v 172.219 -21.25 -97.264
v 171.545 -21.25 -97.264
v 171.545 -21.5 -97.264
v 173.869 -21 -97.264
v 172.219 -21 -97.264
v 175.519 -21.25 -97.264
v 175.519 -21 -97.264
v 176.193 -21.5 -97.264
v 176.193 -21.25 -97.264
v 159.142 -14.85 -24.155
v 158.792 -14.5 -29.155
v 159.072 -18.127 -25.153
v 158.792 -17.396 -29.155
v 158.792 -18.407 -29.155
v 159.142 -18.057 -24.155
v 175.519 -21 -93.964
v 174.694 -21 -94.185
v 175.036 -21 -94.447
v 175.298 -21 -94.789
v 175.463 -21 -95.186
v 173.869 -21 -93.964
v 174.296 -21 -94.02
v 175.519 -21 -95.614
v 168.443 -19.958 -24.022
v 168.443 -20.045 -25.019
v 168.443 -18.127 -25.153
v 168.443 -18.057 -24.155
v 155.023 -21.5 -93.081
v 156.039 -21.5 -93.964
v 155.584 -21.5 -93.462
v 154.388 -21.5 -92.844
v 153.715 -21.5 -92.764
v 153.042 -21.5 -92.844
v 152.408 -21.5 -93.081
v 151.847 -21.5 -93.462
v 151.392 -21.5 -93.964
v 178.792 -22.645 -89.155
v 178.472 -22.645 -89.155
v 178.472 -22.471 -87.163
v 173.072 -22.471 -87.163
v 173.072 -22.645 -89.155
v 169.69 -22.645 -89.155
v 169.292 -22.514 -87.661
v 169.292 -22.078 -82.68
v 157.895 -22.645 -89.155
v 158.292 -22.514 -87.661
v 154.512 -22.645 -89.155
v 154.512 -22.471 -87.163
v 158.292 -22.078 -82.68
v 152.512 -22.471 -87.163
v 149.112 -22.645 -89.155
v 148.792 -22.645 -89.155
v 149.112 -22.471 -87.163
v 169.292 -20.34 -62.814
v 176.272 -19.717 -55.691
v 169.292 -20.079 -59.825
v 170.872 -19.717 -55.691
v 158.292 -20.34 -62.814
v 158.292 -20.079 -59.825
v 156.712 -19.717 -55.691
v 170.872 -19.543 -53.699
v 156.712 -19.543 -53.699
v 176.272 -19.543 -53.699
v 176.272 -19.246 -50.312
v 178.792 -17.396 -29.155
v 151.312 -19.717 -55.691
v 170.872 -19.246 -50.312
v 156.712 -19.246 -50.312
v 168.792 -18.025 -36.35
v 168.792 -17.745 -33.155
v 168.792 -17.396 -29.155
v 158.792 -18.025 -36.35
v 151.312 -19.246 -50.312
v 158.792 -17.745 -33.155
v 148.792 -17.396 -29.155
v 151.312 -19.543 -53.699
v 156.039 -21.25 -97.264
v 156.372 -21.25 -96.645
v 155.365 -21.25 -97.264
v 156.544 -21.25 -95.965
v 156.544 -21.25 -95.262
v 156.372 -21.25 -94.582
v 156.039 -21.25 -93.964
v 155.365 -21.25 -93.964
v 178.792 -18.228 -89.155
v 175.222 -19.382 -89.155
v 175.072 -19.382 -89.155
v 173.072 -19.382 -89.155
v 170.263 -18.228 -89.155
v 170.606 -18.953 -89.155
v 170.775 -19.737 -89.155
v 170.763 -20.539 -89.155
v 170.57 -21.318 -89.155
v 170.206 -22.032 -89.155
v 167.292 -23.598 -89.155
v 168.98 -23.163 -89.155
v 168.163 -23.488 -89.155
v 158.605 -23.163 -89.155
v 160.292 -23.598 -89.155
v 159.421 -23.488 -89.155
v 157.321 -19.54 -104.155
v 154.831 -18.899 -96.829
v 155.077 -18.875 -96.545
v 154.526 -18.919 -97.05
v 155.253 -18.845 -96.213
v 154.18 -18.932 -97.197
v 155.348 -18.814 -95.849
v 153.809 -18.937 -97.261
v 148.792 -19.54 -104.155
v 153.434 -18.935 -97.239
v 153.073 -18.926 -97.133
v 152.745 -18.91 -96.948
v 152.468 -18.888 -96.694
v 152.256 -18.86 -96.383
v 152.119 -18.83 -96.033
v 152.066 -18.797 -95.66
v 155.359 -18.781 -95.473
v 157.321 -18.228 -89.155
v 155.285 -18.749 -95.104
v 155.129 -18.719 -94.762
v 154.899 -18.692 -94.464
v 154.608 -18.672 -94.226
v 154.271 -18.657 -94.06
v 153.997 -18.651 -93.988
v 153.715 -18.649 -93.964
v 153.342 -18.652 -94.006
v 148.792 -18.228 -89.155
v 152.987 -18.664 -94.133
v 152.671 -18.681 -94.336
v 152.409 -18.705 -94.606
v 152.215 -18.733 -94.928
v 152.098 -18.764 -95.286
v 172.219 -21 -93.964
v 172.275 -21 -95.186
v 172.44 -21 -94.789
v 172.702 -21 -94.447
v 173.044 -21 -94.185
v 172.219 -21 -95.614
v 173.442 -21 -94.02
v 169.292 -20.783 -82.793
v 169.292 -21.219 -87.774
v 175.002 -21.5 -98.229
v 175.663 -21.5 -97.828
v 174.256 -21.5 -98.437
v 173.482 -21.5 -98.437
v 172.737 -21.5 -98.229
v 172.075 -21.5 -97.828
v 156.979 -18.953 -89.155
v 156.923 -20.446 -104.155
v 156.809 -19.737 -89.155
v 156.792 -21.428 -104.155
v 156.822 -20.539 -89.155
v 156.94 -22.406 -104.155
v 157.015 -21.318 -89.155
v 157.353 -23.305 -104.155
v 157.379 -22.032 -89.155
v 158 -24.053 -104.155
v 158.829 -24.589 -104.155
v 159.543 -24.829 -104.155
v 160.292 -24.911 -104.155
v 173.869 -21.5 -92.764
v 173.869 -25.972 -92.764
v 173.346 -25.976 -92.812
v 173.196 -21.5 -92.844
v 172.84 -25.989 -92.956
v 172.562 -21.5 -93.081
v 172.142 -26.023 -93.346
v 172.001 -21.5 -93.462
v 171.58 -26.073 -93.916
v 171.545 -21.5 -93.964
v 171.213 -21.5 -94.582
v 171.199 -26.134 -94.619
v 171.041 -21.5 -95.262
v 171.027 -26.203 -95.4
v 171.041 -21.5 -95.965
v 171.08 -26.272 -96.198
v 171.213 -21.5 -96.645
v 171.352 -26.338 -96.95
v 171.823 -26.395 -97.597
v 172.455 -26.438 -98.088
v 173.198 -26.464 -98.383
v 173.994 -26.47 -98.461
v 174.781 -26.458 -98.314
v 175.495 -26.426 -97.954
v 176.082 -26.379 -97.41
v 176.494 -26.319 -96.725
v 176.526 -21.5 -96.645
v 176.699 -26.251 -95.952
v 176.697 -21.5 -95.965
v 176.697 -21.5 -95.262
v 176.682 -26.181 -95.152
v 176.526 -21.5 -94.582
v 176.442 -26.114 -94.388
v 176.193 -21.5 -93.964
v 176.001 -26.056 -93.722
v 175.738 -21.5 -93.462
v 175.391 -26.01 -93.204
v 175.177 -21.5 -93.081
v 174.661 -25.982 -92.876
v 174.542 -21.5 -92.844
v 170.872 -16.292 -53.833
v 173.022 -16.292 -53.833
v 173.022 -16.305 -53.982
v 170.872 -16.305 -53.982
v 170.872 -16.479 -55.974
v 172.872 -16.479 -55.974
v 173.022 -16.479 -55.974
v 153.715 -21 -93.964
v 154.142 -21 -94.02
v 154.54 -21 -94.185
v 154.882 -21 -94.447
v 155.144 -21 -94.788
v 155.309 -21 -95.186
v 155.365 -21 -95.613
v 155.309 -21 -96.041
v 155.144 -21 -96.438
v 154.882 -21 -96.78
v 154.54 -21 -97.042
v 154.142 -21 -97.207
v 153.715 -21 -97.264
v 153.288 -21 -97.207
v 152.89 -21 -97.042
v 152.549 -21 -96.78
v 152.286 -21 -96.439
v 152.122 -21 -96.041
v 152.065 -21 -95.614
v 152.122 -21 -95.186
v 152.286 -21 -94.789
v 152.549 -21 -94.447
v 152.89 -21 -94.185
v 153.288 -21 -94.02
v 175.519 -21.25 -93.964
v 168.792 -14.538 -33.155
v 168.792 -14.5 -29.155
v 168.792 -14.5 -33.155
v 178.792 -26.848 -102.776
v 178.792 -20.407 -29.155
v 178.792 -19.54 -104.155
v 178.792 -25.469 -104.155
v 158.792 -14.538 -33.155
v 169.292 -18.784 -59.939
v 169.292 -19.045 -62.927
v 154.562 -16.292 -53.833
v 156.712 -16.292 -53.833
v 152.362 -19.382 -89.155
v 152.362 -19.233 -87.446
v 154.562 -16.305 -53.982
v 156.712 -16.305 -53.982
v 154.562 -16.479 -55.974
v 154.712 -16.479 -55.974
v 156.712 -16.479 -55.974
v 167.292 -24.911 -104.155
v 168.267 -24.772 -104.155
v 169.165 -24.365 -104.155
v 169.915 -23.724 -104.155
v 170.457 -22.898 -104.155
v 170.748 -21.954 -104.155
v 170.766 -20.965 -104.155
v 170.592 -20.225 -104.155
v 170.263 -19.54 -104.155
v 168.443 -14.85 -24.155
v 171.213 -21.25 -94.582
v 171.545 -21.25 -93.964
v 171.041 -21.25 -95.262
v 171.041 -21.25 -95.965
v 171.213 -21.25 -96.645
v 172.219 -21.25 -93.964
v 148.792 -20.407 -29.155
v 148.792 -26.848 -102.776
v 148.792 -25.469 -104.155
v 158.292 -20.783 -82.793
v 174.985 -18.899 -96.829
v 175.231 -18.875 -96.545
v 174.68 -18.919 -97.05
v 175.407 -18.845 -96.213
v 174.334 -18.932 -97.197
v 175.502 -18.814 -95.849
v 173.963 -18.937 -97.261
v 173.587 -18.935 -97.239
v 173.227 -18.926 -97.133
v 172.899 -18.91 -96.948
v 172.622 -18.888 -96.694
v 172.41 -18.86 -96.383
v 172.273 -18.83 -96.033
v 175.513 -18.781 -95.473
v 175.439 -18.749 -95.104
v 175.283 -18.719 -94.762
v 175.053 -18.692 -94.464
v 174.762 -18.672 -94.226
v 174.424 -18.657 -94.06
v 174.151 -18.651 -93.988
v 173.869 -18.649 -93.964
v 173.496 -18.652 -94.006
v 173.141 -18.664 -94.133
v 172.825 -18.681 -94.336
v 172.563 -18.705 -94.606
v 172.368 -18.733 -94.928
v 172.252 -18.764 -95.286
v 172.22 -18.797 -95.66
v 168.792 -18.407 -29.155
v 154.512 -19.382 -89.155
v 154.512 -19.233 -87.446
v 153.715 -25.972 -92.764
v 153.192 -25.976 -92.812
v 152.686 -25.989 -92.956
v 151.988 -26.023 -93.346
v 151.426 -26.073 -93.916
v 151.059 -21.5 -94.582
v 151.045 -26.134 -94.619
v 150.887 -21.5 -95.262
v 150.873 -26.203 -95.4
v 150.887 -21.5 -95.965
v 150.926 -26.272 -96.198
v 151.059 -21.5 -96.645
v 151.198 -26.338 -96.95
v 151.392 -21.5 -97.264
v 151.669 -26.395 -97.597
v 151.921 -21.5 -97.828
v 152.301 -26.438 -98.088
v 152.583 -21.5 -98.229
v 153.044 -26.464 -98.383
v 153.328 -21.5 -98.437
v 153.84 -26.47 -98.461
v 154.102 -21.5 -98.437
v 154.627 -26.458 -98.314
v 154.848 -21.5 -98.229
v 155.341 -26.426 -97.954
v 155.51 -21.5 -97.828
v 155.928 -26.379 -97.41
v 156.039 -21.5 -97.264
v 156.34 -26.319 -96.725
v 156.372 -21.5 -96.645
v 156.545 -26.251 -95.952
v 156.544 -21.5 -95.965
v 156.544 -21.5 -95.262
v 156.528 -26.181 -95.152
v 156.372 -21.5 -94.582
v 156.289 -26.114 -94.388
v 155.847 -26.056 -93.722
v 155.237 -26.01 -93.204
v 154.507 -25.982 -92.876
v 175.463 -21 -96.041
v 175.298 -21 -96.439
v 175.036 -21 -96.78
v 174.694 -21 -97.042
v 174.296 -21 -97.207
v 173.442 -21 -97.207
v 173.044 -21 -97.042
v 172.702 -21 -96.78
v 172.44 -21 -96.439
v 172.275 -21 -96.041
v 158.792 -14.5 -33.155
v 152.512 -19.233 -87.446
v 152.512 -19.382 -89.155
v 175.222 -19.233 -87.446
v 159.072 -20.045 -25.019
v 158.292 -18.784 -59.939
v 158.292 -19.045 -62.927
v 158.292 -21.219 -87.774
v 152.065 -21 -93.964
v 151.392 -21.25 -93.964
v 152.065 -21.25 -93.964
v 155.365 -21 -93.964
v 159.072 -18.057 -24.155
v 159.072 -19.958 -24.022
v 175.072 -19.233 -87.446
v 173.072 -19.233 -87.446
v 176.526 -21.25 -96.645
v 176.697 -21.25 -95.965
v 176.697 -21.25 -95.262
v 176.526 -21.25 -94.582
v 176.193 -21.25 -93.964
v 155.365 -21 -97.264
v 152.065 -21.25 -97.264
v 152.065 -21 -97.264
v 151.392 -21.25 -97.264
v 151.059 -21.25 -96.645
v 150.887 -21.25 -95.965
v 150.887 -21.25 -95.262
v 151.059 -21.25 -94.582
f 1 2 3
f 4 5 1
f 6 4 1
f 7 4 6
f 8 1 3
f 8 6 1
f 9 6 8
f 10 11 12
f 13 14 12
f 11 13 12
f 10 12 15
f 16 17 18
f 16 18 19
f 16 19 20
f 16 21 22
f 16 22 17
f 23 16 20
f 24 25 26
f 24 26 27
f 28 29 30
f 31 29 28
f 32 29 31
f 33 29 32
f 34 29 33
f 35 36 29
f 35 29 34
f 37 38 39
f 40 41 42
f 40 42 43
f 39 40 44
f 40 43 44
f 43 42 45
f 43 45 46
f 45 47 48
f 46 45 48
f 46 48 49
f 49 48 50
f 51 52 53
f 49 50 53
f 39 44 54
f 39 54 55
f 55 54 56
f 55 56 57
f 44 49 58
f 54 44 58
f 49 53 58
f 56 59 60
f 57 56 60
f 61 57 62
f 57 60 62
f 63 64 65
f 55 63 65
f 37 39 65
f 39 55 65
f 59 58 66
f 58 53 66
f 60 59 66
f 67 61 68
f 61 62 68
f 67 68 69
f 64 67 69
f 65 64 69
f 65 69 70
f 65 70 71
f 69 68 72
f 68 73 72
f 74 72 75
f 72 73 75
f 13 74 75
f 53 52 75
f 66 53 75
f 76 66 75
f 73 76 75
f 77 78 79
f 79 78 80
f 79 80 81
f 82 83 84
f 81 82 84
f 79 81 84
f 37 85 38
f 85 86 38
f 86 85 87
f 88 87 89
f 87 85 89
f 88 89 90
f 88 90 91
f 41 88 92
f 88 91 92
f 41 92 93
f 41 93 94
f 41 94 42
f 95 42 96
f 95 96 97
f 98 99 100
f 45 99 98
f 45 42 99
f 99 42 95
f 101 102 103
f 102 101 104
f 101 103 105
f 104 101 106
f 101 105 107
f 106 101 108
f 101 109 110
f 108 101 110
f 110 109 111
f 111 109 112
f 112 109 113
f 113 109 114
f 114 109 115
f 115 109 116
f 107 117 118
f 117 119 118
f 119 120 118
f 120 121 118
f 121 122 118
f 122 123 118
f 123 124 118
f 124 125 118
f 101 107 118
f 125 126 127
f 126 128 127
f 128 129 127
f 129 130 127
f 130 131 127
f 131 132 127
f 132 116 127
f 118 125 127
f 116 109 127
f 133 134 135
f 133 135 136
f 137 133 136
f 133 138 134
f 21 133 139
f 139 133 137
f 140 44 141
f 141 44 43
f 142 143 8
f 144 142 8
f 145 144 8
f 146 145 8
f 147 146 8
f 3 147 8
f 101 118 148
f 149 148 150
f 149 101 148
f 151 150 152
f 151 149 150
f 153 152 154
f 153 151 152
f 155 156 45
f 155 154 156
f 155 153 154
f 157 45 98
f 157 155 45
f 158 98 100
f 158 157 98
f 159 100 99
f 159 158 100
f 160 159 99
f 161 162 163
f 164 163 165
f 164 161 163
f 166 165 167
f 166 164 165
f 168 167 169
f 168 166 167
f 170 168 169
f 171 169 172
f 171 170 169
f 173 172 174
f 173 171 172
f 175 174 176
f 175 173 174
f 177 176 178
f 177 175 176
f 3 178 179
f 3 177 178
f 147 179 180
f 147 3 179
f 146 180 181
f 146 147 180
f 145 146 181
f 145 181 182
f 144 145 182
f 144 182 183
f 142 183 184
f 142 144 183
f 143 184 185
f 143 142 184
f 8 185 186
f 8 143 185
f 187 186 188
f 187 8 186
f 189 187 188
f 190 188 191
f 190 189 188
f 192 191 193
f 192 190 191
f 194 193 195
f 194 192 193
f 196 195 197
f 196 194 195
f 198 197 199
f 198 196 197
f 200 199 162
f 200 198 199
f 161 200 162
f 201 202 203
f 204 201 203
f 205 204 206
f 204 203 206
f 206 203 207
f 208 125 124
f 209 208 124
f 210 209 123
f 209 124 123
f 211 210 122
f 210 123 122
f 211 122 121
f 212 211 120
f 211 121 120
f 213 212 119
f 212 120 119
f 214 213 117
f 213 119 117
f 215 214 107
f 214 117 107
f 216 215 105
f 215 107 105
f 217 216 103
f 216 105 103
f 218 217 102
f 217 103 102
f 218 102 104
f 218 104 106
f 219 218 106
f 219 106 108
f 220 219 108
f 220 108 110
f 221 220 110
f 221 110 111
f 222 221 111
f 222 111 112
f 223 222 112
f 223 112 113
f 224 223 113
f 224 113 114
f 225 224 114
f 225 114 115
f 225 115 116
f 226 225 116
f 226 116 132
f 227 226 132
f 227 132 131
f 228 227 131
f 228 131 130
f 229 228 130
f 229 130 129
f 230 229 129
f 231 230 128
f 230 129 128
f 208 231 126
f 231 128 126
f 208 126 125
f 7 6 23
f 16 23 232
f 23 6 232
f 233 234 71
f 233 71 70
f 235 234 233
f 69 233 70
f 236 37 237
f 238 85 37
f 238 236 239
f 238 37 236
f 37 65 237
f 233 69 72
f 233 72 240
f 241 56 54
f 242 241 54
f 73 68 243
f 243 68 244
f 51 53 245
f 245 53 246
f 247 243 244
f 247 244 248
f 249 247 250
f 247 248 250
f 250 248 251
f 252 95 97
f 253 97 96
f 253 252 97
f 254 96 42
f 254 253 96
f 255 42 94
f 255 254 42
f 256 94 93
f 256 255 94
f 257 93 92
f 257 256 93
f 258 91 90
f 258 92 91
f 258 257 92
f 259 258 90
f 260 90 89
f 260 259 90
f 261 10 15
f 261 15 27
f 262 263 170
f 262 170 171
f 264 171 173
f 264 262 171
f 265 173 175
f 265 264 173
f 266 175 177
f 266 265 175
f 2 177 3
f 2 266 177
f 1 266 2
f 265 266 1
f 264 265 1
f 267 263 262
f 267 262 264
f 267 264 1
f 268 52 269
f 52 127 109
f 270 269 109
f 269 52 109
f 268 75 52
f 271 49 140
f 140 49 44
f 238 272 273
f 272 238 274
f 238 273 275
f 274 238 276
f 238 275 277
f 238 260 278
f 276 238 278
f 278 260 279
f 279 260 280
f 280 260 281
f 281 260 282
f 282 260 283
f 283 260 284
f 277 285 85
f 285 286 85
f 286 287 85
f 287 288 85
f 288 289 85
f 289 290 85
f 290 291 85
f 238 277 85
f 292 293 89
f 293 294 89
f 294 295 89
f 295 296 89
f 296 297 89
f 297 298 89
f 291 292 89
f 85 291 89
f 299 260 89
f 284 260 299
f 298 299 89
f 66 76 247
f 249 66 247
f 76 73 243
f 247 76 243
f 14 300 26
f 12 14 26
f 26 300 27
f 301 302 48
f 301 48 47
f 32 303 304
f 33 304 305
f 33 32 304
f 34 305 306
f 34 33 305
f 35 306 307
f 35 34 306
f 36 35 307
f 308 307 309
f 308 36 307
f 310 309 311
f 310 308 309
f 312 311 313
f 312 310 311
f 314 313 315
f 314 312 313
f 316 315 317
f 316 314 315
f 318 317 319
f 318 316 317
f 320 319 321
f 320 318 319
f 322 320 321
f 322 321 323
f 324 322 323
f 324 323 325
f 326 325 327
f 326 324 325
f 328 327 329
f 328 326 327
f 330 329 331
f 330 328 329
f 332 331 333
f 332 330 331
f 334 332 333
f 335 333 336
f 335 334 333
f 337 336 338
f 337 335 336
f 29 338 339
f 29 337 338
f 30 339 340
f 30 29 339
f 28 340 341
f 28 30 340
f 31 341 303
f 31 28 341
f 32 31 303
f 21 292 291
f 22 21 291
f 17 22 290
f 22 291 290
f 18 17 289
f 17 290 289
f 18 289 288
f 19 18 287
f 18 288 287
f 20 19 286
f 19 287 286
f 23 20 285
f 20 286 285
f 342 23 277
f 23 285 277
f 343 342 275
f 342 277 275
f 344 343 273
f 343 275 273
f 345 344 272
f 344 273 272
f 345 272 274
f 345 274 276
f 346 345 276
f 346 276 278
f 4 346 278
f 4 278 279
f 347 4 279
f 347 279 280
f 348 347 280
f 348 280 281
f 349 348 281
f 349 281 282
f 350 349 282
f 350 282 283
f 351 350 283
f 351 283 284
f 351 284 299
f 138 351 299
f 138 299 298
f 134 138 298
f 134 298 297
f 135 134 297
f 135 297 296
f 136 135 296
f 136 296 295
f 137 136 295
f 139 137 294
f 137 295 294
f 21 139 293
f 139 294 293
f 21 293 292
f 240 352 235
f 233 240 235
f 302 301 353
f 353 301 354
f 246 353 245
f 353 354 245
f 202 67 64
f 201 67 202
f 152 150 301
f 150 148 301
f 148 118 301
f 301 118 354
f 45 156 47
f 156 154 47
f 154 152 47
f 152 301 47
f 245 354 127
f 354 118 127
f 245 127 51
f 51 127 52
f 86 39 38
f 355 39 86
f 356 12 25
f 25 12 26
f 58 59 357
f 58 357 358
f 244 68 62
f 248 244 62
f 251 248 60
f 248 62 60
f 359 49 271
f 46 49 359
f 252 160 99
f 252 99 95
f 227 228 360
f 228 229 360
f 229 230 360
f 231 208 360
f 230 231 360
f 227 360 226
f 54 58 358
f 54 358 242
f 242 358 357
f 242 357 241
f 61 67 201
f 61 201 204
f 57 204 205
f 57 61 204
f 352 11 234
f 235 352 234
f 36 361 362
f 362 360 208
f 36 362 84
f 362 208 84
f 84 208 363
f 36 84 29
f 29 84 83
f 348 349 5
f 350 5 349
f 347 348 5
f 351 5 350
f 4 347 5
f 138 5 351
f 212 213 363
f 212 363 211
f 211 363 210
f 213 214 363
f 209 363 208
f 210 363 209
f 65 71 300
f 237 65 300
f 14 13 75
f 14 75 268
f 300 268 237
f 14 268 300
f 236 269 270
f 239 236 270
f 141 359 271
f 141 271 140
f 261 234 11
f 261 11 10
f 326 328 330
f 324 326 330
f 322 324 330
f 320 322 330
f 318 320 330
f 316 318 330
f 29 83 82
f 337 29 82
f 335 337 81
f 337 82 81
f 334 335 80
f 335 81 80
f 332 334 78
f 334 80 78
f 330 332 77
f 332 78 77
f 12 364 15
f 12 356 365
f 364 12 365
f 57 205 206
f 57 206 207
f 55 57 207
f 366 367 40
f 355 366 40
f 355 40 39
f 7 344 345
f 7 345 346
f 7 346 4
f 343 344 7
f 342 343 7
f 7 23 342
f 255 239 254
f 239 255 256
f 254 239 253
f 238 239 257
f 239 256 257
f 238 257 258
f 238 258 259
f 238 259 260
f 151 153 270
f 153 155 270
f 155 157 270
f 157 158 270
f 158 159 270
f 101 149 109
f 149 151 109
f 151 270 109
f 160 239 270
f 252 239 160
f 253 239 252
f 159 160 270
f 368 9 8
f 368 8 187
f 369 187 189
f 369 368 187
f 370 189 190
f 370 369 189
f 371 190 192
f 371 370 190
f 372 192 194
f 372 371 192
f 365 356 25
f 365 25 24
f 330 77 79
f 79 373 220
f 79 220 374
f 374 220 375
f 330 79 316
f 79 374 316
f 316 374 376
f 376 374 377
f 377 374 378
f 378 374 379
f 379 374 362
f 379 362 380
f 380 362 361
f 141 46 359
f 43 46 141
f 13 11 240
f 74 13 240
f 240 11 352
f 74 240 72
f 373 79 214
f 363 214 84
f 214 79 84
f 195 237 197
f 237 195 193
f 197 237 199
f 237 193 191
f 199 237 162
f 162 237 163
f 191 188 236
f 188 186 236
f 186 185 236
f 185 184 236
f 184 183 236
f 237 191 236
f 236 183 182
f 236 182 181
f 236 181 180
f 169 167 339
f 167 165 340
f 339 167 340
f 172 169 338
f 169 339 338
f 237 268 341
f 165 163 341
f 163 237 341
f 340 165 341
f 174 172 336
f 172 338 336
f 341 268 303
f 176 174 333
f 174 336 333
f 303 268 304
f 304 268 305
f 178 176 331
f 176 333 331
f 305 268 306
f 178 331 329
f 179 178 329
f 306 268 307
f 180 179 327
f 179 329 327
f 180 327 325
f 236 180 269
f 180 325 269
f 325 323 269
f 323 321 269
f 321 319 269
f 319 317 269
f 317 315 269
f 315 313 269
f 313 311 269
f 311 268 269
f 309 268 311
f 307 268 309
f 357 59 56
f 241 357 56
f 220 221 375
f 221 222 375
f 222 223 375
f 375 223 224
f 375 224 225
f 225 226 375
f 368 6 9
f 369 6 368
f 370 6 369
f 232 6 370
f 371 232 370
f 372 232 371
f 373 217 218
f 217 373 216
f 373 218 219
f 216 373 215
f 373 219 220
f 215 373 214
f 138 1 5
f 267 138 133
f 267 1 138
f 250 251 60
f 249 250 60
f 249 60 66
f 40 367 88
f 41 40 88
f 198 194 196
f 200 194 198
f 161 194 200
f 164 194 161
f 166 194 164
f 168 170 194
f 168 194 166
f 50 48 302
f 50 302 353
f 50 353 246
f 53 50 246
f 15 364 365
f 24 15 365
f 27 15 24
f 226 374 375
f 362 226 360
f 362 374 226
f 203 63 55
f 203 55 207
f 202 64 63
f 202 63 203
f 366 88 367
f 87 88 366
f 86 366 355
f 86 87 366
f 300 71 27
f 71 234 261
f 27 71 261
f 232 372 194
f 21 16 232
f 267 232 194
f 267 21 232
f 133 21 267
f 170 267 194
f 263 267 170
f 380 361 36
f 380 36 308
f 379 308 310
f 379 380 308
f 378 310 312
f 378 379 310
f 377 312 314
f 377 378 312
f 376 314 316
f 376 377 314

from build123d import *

# Parameters (mm, degrees)
BOSS_EXTRUDE2_DEPTH = 30
CUT_EXTRUDE1_REACH  = 197.235
CUT_EXTRUDE2_START  = 7
SKETCH6_R           = 2.85
CUT_EXTRUDE2_DEPTH  = 201.285862098
SKETCH7_R           = 1.65
CUT_EXTRUDE3_DEPTH  = 209.121088475
SKETCH9_W           = 10
SKETCH9_H           = 5.906967626
BOSS_EXTRUDE4_DEPTH = 4
SKETCH10_W          = 10
SKETCH10_H          = 3.906967626
BOSS_EXTRUDE5_DEPTH = 5
BOSS_EXTRUDE5_TAPER = 4
FILLET1_SIZE        = 3.5
CUT_EXTRUDE4_START  = -0.25
CUT_EXTRUDE4_DEPTH  = 0.25
SKETCH12_W          = 3.3
SKETCH12_H          = 3.3
CUT_EXTRUDE5_DEPTH  = 0.25
SKETCH13_W          = 2
SKETCH13_H          = 2
BOSS_EXTRUDE6_DEPTH = 3.25
BOSS_EXTRUDE7_REACH = 209.762
SKETCH14_W          = 9.370488354
SKETCH14_H          = 1
SKETCH17_W          = 11
SKETCH17_H          = 5
SKETCH17_H_2        = 3
BOSS_EXTRUDE8_DEPTH = 1.3


with BuildPart() as part:
    # Sketch2 → Boss-Extrude2 (new body)
    with BuildSketch(Plane(origin=(148.792269218, 0, 0), x_dir=(0, 0, -1), z_dir=(1, 0, 0))):
        Polygon((89.155083501, -18.22802064), (89.155083501, -22.644827925), (29.155083501, -17.395508114), (29.155083501, -20.406967626), (102.775758778, -26.847942114), (104.155083501, -25.468617391), (104.155083501, -19.540350593), align=None)
    extrude(amount=BOSS_EXTRUDE2_DEPTH)

    # Cut-Extrude1: up to this plane
    cut_extrude1_end = Plane(origin=(254.385579164, -18.22802064, -89.155083501), z_dir=(0, 0, -1))
    # Sketch4 → Cut-Extrude1 (cut, up to the surface)
    with BuildSketch(Plane(origin=(0, -9.236632985, -105.575198123), x_dir=(-1, 0, 0), z_dir=(0, -0.0871557427476512, -0.9961946980917462)), mode=Mode.PRIVATE) as cut_extrude1_sk1:
        with BuildLine():
            Line((-167.292269218, -8.738279996), (-160.292269218, -8.738279996))
            ThreePointArc((-160.292269218, -8.738279996), (-156.792269218, -12.238279996), (-160.292269218, -15.738279996))
            Line((-160.292269218, -15.738279996), (-167.292269218, -15.738279996))
            ThreePointArc((-167.292269218, -15.738279996), (-170.792269218, -12.238279996), (-167.292269218, -8.738279996))
        make_face()
    cut_extrude1_tool1 = split(extrude(cut_extrude1_sk1.sketch, amount=-CUT_EXTRUDE1_REACH, mode=Mode.PRIVATE), bisect_by=cut_extrude1_end, keep=Keep.BOTH, mode=Mode.PRIVATE)
    add(cut_extrude1_tool1.solids().sort_by_distance((163.792269, -21.428343, -104.508562))[0], mode=Mode.SUBTRACT)

    # Sketch6 → Cut-Extrude2 (cut, through all)
    with BuildSketch(Plane(origin=(0, -14.5, 0), x_dir=(-1, 0, 0), z_dir=(0, -1, 0)).offset(CUT_EXTRUDE2_START)):
        with Locations(Location((-173.869198237, 95.613531365, 0), (0, 0, 270))):
            Circle(SKETCH6_R)
        with Locations(Location((-153.7153402, 95.613531365, 0), (0, 0, 270))):
            Circle(SKETCH6_R)
    extrude(amount=CUT_EXTRUDE2_DEPTH, mode=Mode.SUBTRACT)

    # Sketch7 → Cut-Extrude3 (cut, through all)
    with BuildSketch(Plane(origin=(0, -4.5, 0), x_dir=(1, 0, 0), z_dir=(0, 1, 0))):
        with Locations(Location((173.869198237, 95.613531365, 0), (0, 0, 270))):
            Circle(SKETCH7_R)
        with Locations(Location((153.7153402, 95.613531365, 0), (0, 0, 270))):
            Circle(SKETCH7_R)
    extrude(amount=-CUT_EXTRUDE3_DEPTH, mode=Mode.SUBTRACT)

    # Sketch9 → Boss-Extrude4 (add)
    with BuildSketch(Plane.XY.offset(-29.155083501)):
        with Locations((163.792269218, -17.453483813)):
            Rectangle(SKETCH9_W, SKETCH9_H)
    extrude(amount=-BOSS_EXTRUDE4_DEPTH)

    # Sketch10 → Boss-Extrude5 (add)
    with BuildSketch(Plane.XY.offset(-29.155083501)):
        with Locations((163.792269218, -16.453483813)):
            Rectangle(SKETCH10_W, SKETCH10_H)
    extrude(amount=BOSS_EXTRUDE5_DEPTH, taper=BOSS_EXTRUDE5_TAPER)

    # Fillet1
    # the kernel refuses this chamfer: 3.5 mm, written as the material it adds along each edge
    with BuildSketch(Plane(origin=(158.792269218, -17.745462768, -33.155083501), x_dir=(0, -0.11557140669619721, -0.9932991744455757), z_dir=(1, 0, 0))) as fillet1_piece_1:
        Polygon((FILLET1_SIZE * 0.915957386947, FILLET1_SIZE * 0.0261703223739), (-FILLET1_SIZE * 0.105901682781, FILLET1_SIZE * 0.91019099867), (0, 0), align=None)
    extrude(amount=10)

    # Sketch11 → Cut-Extrude4 (cut)
    with BuildSketch(Plane.XZ.offset(21.5).offset(CUT_EXTRUDE4_START)):
        with BuildLine():
            Line((171.545408229, -97.263531365), (176.192988244, -97.263531365))
            ThreePointArc((176.192988244, -97.263531365), (176.719198237, -95.613531365), (176.192988244, -93.963531365))
            Line((176.192988244, -93.963531365), (171.545408229, -93.963531365))
            ThreePointArc((171.545408229, -93.963531365), (171.019198237, -95.613531365), (171.545408229, -97.263531365))
        make_face()
    cut_extrude4 = extrude(amount=CUT_EXTRUDE4_DEPTH, mode=Mode.SUBTRACT)

    # Sketch12 → Cut-Extrude5 (cut)
    with BuildSketch(Plane.XZ.offset(21.25)):
        with Locations((173.869198237, -95.613531365)):
            Rectangle(SKETCH12_W, SKETCH12_H)
    cut_extrude5 = extrude(amount=-CUT_EXTRUDE5_DEPTH, mode=Mode.SUBTRACT)

    # Mirror1: Cut-Extrude4, Cut-Extrude5 across plane
    add(cut_extrude4.mirror(Plane(origin=(163.792269218, 0, 0), x_dir=(0, 0, 1), z_dir=(1, 0, 0))), mode=Mode.SUBTRACT)
    add(cut_extrude5.mirror(Plane(origin=(163.792269218, 0, 0), x_dir=(0, 0, 1), z_dir=(1, 0, 0))), mode=Mode.SUBTRACT)

    # Sketch13 → Boss-Extrude6 (add)
    with BuildSketch(Plane(origin=(0, -14.732006126, 1.288883527), x_dir=(1, 0, 0), z_dir=(0, 0.9961946980917463, -0.08715574274765082))):
        with Locations((171.872269218, 56.19771425)):
            Rectangle(SKETCH13_W, SKETCH13_H)
        with Locations((174.072269218, 89.789448289)):
            Rectangle(SKETCH13_W, SKETCH13_H)
    boss_extrude6 = extrude(amount=BOSS_EXTRUDE6_DEPTH)

    # Chamfer1
    # the kernel refuses this chamfer: 3.4 mm, written as the material it adds along each edge
    with BuildSketch(Plane(origin=(170.872269218, -19.542803909, -53.698786756), x_dir=(0, 0.059731544136399986, 0.9982144772718343), z_dir=(1, 0, 0))) as chamfer1_piece_1_section:
        with BuildLine():
            Line((3.497488864, 0), (-0.192260327, -3.492200498))
            Line((-0.192260327, -3.492200498), (-0.260234617, -3.490330778))
            ThreePointArc((-0.260234617, -3.490330778), (-0.116039372, -1.745552621), (-0.06797429, 0.00186972))
            Line((-0.06797429, 0.00186972), (0.00186972, 0.06797429))
            ThreePointArc((0.00186972, 0.06797429), (1.74929206, 0.019909209), (3.499358583, 0.06797429))
            Line((3.499358583, 0.06797429), (3.497488864, 0))
        make_face()
    chamfer1_piece_1 = extrude(amount=2, mode=Mode.PRIVATE)
    chamfer1_piece_1 = split(chamfer1_piece_1, bisect_by=Plane(origin=(171.872269218, -16.206722557, -52.85677046), z_dir=(0, -0.9961946980917463, 0.08715574274765082)), keep=Keep.TOP, mode=Mode.PRIVATE)
    add(chamfer1_piece_1)
    with BuildSketch(Plane(origin=(172.872269218, -19.542803909, -53.698786756), x_dir=(0.999621916911297, -0.027391246498838125, 0.002396423548492289), z_dir=(0, -0.08715574274765082, -0.9961946980917463))) as chamfer1_piece_2_section:
        with BuildLine():
            Line((3.497488864, 0), (-0.192260327, -3.492200498))
            Line((-0.192260327, -3.492200498), (-0.260234617, -3.490330778))
            ThreePointArc((-0.260234617, -3.490330778), (-0.116039372, -1.745552621), (-0.06797429, 0.00186972))
            Line((-0.06797429, 0.00186972), (0.00186972, 0.06797429))
            ThreePointArc((0.00186972, 0.06797429), (1.74929206, 0.019909209), (3.499358583, 0.06797429))
            Line((3.499358583, 0.06797429), (3.497488864, 0))
        make_face()
    chamfer1_piece_2 = extrude(amount=2, mode=Mode.PRIVATE)
    chamfer1_piece_2 = split(chamfer1_piece_2, bisect_by=Plane(origin=(174.001840036, -16.392326883, -54.978237618), z_dir=(0, -0.9961946980917463, 0.08715574274765082)), keep=Keep.TOP, mode=Mode.PRIVATE)
    add(chamfer1_piece_2)
    with BuildSketch(Plane(origin=(175.072269218, -22.47051644, -87.162694105), x_dir=(0.9996219169112963, -0.027391246498863667, 0.0023964235484945228), z_dir=(0, -0.08715574274765082, -0.9961946980917463))) as chamfer1_piece_3_section:
        with BuildLine():
            Line((3.497488864, 0), (-0.192260327, -3.492200498))
            Line((-0.192260327, -3.492200498), (-0.260234617, -3.490330778))
            ThreePointArc((-0.260234617, -3.490330778), (-0.116039372, -1.745552621), (-0.06797429, 0.00186972))
            Line((-0.06797429, 0.00186972), (0.00186972, 0.06797429))
            ThreePointArc((0.00186972, 0.06797429), (1.74929206, 0.019909209), (3.499358583, 0.06797429))
            Line((3.499358583, 0.06797429), (3.497488864, 0))
        make_face()
    chamfer1_piece_3 = extrude(amount=10.743722159, mode=Mode.PRIVATE)
    chamfer1_piece_3 = split(chamfer1_piece_3, bisect_by=Plane(origin=(176.219153997, -21.484451045, -89.155083501), z_dir=(0, 0, 1)), keep=Keep.TOP, mode=Mode.PRIVATE)
    chamfer1_piece_3 = split(chamfer1_piece_3, bisect_by=Plane(origin=(176.219153997, -19.315947713, -88.395376614), z_dir=(0, -0.9961946980917463, 0.08715574274765082)), keep=Keep.TOP, mode=Mode.PRIVATE)
    add(chamfer1_piece_3)
    with BuildSketch(Plane(origin=(172.872269218, -18.78073831, -44.988337099), x_dir=(0.9996219169112966, -0.027391246498851222, 0.0023964235484934342), z_dir=(0, -0.08715574274765082, -0.9961946980917463))) as chamfer1_piece_4a_section:
        with BuildLine():
            Line((3.497488864, 0), (-0.192260327, -3.492200498))
            Line((-0.192260327, -3.492200498), (-0.260234617, -3.490330778))
            ThreePointArc((-0.260234617, -3.490330778), (-0.116039372, -1.745552621), (-0.06797429, 0.00186972))
            Line((-0.06797429, 0.00186972), (0.00186972, 0.06797429))
            ThreePointArc((0.00186972, 0.06797429), (1.74929206, 0.019909209), (3.499358583, 0.06797429))
            Line((3.499358583, 0.06797429), (3.497488864, 0))
        make_face()
    chamfer1_piece_4a = extrude(amount=10.743722159, mode=Mode.PRIVATE)
    chamfer1_piece_4a = split(chamfer1_piece_4a, bisect_by=Plane(origin=(174.001840036, -18.441436891, -53.795143884), z_dir=(0, 0.08715574274765084, 0.9961946980917462)), keep=Keep.TOP, mode=Mode.PRIVATE)
    chamfer1_piece_4a = split(chamfer1_piece_4a, bisect_by=Plane(origin=(174.001840036, -15.924138341, -49.626818091), z_dir=(0, -0.9961946980917463, 0.08715574274765082)), keep=Keep.TOP, mode=Mode.PRIVATE)
    with BuildSketch(Plane(origin=(170.872269218, -19.542803909, -53.698786756), x_dir=(0, 0.059731544136399986, 0.9982144772718343), z_dir=(1, 0, 0))) as chamfer1_piece_4b_section:
        with BuildLine():
            Line((3.497488864, 0), (-0.192260327, -3.492200498))
            Line((-0.192260327, -3.492200498), (-0.260234617, -3.490330778))
            ThreePointArc((-0.260234617, -3.490330778), (-0.116039372, -1.745552621), (-0.06797429, 0.00186972))
            Line((-0.06797429, 0.00186972), (0.00186972, 0.06797429))
            ThreePointArc((0.00186972, 0.06797429), (1.74929206, 0.019909209), (3.499358583, 0.06797429))
            Line((3.499358583, 0.06797429), (3.497488864, 0))
        make_face()
    chamfer1_piece_4b = extrude(amount=10.743722159, mode=Mode.PRIVATE)
    chamfer1_piece_4b = split(chamfer1_piece_4b, bisect_by=Plane(origin=(178.792269218, -18.342988307, -52.669871424), z_dir=(-1, 0, 0)), keep=Keep.TOP, mode=Mode.PRIVATE)
    chamfer1_piece_4b = split(chamfer1_piece_4b, bisect_by=Plane(origin=(172.872269218, -18.342988307, -52.669871424), z_dir=(1, 0, 0)), keep=Keep.TOP, mode=Mode.PRIVATE)
    chamfer1_piece_4b = split(chamfer1_piece_4b, bisect_by=Plane(origin=(175.832269218, -16.206722557, -52.85677046), z_dir=(0, -0.9961946980917463, 0.08715574274765082)), keep=Keep.TOP, mode=Mode.PRIVATE)
    chamfer1_piece_4 = chamfer1_piece_4a & chamfer1_piece_4b
    add(chamfer1_piece_4)

    # Mirror2: Boss-Extrude6 across plane
    add(boss_extrude6.mirror(Plane(origin=(163.792269218, 0, 0), x_dir=(0, 0, 1), z_dir=(1, 0, 0))))

    # Chamfer1 of Mirror2
    # the kernel refuses this chamfer: 3.4 mm, written as the material it adds along each edge
    with BuildSketch(Plane(origin=(156.712269218, -19.542803909, -53.698786756), x_dir=(0, 0.05973154413639897, 0.9982144772718343), z_dir=(-1, 0, 0))) as chamfer1_of_mirror2_piece_1_section:
        with BuildLine():
            Line((3.497488864, 0), (-0.192260327, 3.492200498))
            Line((-0.192260327, 3.492200498), (-0.260234617, 3.490330778))
            ThreePointArc((-0.260234617, 3.490330778), (-0.116039372, 1.745552621), (-0.06797429, -0.00186972))
            Line((-0.06797429, -0.00186972), (0.00186972, -0.06797429))
            ThreePointArc((0.00186972, -0.06797429), (1.74929206, -0.019909209), (3.499358583, -0.06797429))
            Line((3.499358583, -0.06797429), (3.497488864, 0))
        make_face()
    chamfer1_of_mirror2_piece_1 = extrude(amount=2, mode=Mode.PRIVATE)
    chamfer1_of_mirror2_piece_1 = split(chamfer1_of_mirror2_piece_1, bisect_by=Plane(origin=(155.712269218, -16.206722557, -52.85677046), z_dir=(0, -0.9961946980917463, 0.08715574274765082)), keep=Keep.TOP, mode=Mode.PRIVATE)
    add(chamfer1_of_mirror2_piece_1)
    with BuildSketch(Plane(origin=(154.712269218, -19.542803909, -53.698786756), x_dir=(-0.999621916911297, -0.027391246498838125, 0.002396423548492289), z_dir=(0, -0.08715574274765082, -0.9961946980917463))) as chamfer1_of_mirror2_piece_2_section:
        with BuildLine():
            Line((3.497488864, 0), (-0.192260327, 3.492200498))
            Line((-0.192260327, 3.492200498), (-0.260234617, 3.490330778))
            ThreePointArc((-0.260234617, 3.490330778), (-0.116039372, 1.745552621), (-0.06797429, -0.00186972))
            Line((-0.06797429, -0.00186972), (0.00186972, -0.06797429))
            ThreePointArc((0.00186972, -0.06797429), (1.74929206, -0.019909209), (3.499358583, -0.06797429))
            Line((3.499358583, -0.06797429), (3.497488864, 0))
        make_face()
    chamfer1_of_mirror2_piece_2 = extrude(amount=2, mode=Mode.PRIVATE)
    chamfer1_of_mirror2_piece_2 = split(chamfer1_of_mirror2_piece_2, bisect_by=Plane(origin=(153.582698401, -16.392326883, -54.978237618), z_dir=(0, -0.9961946980917463, 0.08715574274765082)), keep=Keep.TOP, mode=Mode.PRIVATE)
    add(chamfer1_of_mirror2_piece_2)
    with BuildSketch(Plane(origin=(152.512269218, -22.47051644, -87.162694105), x_dir=(-0.9996219169112963, -0.027391246498863667, 0.0023964235484945228), z_dir=(0, -0.08715574274765082, -0.9961946980917463))) as chamfer1_of_mirror2_piece_3_section:
        with BuildLine():
            Line((3.497488864, 0), (-0.192260327, 3.492200498))
            Line((-0.192260327, 3.492200498), (-0.260234617, 3.490330778))
            ThreePointArc((-0.260234617, 3.490330778), (-0.116039372, 1.745552621), (-0.06797429, -0.00186972))
            Line((-0.06797429, -0.00186972), (0.00186972, -0.06797429))
            ThreePointArc((0.00186972, -0.06797429), (1.74929206, -0.019909209), (3.499358583, -0.06797429))
            Line((3.499358583, -0.06797429), (3.497488864, 0))
        make_face()
    chamfer1_of_mirror2_piece_3 = extrude(amount=10.743722159, mode=Mode.PRIVATE)
    chamfer1_of_mirror2_piece_3 = split(chamfer1_of_mirror2_piece_3, bisect_by=Plane(origin=(151.365384439, -21.484451045, -89.155083501), z_dir=(0, 0, 1)), keep=Keep.TOP, mode=Mode.PRIVATE)
    chamfer1_of_mirror2_piece_3 = split(chamfer1_of_mirror2_piece_3, bisect_by=Plane(origin=(151.365384439, -19.315947713, -88.395376614), z_dir=(0, -0.9961946980917463, 0.08715574274765082)), keep=Keep.TOP, mode=Mode.PRIVATE)
    add(chamfer1_of_mirror2_piece_3)
    with BuildSketch(Plane(origin=(156.712269218, -19.542803909, -53.698786756), x_dir=(0, 0.05973154413639897, 0.9982144772718343), z_dir=(-1, 0, 0))) as chamfer1_of_mirror2_piece_4a_section:
        with BuildLine():
            Line((3.497488864, 0), (-0.192260327, 3.492200498))
            Line((-0.192260327, 3.492200498), (-0.260234617, 3.490330778))
            ThreePointArc((-0.260234617, 3.490330778), (-0.116039372, 1.745552621), (-0.06797429, -0.00186972))
            Line((-0.06797429, -0.00186972), (0.00186972, -0.06797429))
            ThreePointArc((0.00186972, -0.06797429), (1.74929206, -0.019909209), (3.499358583, -0.06797429))
            Line((3.499358583, -0.06797429), (3.497488864, 0))
        make_face()
    chamfer1_of_mirror2_piece_4a = extrude(amount=10.743722159, mode=Mode.PRIVATE)
    chamfer1_of_mirror2_piece_4a = split(chamfer1_of_mirror2_piece_4a, bisect_by=Plane(origin=(148.792269218, -18.342988307, -52.669871424), z_dir=(1, 0, 0)), keep=Keep.TOP, mode=Mode.PRIVATE)
    chamfer1_of_mirror2_piece_4a = split(chamfer1_of_mirror2_piece_4a, bisect_by=Plane(origin=(154.712269218, -18.342988307, -52.669871424), z_dir=(-1, 0, 0)), keep=Keep.TOP, mode=Mode.PRIVATE)
    chamfer1_of_mirror2_piece_4a = split(chamfer1_of_mirror2_piece_4a, bisect_by=Plane(origin=(151.752269218, -16.206722557, -52.85677046), z_dir=(0, -0.9961946980917463, 0.08715574274765082)), keep=Keep.TOP, mode=Mode.PRIVATE)
    with BuildSketch(Plane(origin=(154.712269218, -18.78073831, -44.988337099), x_dir=(-0.9996219169112966, -0.027391246498851222, 0.0023964235484934342), z_dir=(0, -0.08715574274765082, -0.9961946980917463))) as chamfer1_of_mirror2_piece_4b_section:
        with BuildLine():
            Line((3.497488864, 0), (-0.192260327, 3.492200498))
            Line((-0.192260327, 3.492200498), (-0.260234617, 3.490330778))
            ThreePointArc((-0.260234617, 3.490330778), (-0.116039372, 1.745552621), (-0.06797429, -0.00186972))
            Line((-0.06797429, -0.00186972), (0.00186972, -0.06797429))
            ThreePointArc((0.00186972, -0.06797429), (1.74929206, -0.019909209), (3.499358583, -0.06797429))
            Line((3.499358583, -0.06797429), (3.497488864, 0))
        make_face()
    chamfer1_of_mirror2_piece_4b = extrude(amount=10.743722159, mode=Mode.PRIVATE)
    chamfer1_of_mirror2_piece_4b = split(chamfer1_of_mirror2_piece_4b, bisect_by=Plane(origin=(153.582698401, -18.441436891, -53.795143884), z_dir=(0, 0.08715574274765084, 0.9961946980917462)), keep=Keep.TOP, mode=Mode.PRIVATE)
    chamfer1_of_mirror2_piece_4b = split(chamfer1_of_mirror2_piece_4b, bisect_by=Plane(origin=(153.582698401, -15.924138341, -49.626818091), z_dir=(0, -0.9961946980917463, 0.08715574274765082)), keep=Keep.TOP, mode=Mode.PRIVATE)
    chamfer1_of_mirror2_piece_4 = chamfer1_of_mirror2_piece_4a & chamfer1_of_mirror2_piece_4b
    add(chamfer1_of_mirror2_piece_4)

    # Boss-Extrude7: up to this plane
    boss_extrude7_end = Plane(origin=(254.385579164, -17.72059022, 1.550350755), z_dir=(0, 0.9961946980917462, -0.08715574274765119))
    # Sketch14 → Boss-Extrude7 (add, up to the surface)
    with BuildSketch(Plane(origin=(0, -16.288598265, 1.139009748), x_dir=(1, 0, 0), z_dir=(0, -0.9975640502598242, 0.06975647374412541)), mode=Mode.PRIVATE) as boss_extrude7_sk1:
        with Locations((163.757390981, -25.855858847)):
            Rectangle(SKETCH14_W, SKETCH14_H)
    boss_extrude7_tool1 = split(extrude(boss_extrude7_sk1.sketch, amount=BOSS_EXTRUDE7_REACH, mode=Mode.PRIVATE), bisect_by=boss_extrude7_end, keep=Keep.BOTH, mode=Mode.PRIVATE)
    add(boss_extrude7_tool1.solids().sort_by_distance((163.757391, -18.092212, -24.653866))[0])

    # Sketch17 → Boss-Extrude8 (add)
    with BuildSketch(Plane(origin=(0, -14.732006126, 1.288883527), x_dir=(1, 0, 0), z_dir=(0, 0.9961946980917461, -0.08715574274765119))):
        with Locations((163.792269218, 86.789448289)):
            Rectangle(SKETCH17_W, SKETCH17_H)
        with Locations((163.792269218, 62.84771425)):
            Rectangle(SKETCH17_W, SKETCH17_H_2)
    extrude(amount=BOSS_EXTRUDE8_DEPTH)


solid = part.part
